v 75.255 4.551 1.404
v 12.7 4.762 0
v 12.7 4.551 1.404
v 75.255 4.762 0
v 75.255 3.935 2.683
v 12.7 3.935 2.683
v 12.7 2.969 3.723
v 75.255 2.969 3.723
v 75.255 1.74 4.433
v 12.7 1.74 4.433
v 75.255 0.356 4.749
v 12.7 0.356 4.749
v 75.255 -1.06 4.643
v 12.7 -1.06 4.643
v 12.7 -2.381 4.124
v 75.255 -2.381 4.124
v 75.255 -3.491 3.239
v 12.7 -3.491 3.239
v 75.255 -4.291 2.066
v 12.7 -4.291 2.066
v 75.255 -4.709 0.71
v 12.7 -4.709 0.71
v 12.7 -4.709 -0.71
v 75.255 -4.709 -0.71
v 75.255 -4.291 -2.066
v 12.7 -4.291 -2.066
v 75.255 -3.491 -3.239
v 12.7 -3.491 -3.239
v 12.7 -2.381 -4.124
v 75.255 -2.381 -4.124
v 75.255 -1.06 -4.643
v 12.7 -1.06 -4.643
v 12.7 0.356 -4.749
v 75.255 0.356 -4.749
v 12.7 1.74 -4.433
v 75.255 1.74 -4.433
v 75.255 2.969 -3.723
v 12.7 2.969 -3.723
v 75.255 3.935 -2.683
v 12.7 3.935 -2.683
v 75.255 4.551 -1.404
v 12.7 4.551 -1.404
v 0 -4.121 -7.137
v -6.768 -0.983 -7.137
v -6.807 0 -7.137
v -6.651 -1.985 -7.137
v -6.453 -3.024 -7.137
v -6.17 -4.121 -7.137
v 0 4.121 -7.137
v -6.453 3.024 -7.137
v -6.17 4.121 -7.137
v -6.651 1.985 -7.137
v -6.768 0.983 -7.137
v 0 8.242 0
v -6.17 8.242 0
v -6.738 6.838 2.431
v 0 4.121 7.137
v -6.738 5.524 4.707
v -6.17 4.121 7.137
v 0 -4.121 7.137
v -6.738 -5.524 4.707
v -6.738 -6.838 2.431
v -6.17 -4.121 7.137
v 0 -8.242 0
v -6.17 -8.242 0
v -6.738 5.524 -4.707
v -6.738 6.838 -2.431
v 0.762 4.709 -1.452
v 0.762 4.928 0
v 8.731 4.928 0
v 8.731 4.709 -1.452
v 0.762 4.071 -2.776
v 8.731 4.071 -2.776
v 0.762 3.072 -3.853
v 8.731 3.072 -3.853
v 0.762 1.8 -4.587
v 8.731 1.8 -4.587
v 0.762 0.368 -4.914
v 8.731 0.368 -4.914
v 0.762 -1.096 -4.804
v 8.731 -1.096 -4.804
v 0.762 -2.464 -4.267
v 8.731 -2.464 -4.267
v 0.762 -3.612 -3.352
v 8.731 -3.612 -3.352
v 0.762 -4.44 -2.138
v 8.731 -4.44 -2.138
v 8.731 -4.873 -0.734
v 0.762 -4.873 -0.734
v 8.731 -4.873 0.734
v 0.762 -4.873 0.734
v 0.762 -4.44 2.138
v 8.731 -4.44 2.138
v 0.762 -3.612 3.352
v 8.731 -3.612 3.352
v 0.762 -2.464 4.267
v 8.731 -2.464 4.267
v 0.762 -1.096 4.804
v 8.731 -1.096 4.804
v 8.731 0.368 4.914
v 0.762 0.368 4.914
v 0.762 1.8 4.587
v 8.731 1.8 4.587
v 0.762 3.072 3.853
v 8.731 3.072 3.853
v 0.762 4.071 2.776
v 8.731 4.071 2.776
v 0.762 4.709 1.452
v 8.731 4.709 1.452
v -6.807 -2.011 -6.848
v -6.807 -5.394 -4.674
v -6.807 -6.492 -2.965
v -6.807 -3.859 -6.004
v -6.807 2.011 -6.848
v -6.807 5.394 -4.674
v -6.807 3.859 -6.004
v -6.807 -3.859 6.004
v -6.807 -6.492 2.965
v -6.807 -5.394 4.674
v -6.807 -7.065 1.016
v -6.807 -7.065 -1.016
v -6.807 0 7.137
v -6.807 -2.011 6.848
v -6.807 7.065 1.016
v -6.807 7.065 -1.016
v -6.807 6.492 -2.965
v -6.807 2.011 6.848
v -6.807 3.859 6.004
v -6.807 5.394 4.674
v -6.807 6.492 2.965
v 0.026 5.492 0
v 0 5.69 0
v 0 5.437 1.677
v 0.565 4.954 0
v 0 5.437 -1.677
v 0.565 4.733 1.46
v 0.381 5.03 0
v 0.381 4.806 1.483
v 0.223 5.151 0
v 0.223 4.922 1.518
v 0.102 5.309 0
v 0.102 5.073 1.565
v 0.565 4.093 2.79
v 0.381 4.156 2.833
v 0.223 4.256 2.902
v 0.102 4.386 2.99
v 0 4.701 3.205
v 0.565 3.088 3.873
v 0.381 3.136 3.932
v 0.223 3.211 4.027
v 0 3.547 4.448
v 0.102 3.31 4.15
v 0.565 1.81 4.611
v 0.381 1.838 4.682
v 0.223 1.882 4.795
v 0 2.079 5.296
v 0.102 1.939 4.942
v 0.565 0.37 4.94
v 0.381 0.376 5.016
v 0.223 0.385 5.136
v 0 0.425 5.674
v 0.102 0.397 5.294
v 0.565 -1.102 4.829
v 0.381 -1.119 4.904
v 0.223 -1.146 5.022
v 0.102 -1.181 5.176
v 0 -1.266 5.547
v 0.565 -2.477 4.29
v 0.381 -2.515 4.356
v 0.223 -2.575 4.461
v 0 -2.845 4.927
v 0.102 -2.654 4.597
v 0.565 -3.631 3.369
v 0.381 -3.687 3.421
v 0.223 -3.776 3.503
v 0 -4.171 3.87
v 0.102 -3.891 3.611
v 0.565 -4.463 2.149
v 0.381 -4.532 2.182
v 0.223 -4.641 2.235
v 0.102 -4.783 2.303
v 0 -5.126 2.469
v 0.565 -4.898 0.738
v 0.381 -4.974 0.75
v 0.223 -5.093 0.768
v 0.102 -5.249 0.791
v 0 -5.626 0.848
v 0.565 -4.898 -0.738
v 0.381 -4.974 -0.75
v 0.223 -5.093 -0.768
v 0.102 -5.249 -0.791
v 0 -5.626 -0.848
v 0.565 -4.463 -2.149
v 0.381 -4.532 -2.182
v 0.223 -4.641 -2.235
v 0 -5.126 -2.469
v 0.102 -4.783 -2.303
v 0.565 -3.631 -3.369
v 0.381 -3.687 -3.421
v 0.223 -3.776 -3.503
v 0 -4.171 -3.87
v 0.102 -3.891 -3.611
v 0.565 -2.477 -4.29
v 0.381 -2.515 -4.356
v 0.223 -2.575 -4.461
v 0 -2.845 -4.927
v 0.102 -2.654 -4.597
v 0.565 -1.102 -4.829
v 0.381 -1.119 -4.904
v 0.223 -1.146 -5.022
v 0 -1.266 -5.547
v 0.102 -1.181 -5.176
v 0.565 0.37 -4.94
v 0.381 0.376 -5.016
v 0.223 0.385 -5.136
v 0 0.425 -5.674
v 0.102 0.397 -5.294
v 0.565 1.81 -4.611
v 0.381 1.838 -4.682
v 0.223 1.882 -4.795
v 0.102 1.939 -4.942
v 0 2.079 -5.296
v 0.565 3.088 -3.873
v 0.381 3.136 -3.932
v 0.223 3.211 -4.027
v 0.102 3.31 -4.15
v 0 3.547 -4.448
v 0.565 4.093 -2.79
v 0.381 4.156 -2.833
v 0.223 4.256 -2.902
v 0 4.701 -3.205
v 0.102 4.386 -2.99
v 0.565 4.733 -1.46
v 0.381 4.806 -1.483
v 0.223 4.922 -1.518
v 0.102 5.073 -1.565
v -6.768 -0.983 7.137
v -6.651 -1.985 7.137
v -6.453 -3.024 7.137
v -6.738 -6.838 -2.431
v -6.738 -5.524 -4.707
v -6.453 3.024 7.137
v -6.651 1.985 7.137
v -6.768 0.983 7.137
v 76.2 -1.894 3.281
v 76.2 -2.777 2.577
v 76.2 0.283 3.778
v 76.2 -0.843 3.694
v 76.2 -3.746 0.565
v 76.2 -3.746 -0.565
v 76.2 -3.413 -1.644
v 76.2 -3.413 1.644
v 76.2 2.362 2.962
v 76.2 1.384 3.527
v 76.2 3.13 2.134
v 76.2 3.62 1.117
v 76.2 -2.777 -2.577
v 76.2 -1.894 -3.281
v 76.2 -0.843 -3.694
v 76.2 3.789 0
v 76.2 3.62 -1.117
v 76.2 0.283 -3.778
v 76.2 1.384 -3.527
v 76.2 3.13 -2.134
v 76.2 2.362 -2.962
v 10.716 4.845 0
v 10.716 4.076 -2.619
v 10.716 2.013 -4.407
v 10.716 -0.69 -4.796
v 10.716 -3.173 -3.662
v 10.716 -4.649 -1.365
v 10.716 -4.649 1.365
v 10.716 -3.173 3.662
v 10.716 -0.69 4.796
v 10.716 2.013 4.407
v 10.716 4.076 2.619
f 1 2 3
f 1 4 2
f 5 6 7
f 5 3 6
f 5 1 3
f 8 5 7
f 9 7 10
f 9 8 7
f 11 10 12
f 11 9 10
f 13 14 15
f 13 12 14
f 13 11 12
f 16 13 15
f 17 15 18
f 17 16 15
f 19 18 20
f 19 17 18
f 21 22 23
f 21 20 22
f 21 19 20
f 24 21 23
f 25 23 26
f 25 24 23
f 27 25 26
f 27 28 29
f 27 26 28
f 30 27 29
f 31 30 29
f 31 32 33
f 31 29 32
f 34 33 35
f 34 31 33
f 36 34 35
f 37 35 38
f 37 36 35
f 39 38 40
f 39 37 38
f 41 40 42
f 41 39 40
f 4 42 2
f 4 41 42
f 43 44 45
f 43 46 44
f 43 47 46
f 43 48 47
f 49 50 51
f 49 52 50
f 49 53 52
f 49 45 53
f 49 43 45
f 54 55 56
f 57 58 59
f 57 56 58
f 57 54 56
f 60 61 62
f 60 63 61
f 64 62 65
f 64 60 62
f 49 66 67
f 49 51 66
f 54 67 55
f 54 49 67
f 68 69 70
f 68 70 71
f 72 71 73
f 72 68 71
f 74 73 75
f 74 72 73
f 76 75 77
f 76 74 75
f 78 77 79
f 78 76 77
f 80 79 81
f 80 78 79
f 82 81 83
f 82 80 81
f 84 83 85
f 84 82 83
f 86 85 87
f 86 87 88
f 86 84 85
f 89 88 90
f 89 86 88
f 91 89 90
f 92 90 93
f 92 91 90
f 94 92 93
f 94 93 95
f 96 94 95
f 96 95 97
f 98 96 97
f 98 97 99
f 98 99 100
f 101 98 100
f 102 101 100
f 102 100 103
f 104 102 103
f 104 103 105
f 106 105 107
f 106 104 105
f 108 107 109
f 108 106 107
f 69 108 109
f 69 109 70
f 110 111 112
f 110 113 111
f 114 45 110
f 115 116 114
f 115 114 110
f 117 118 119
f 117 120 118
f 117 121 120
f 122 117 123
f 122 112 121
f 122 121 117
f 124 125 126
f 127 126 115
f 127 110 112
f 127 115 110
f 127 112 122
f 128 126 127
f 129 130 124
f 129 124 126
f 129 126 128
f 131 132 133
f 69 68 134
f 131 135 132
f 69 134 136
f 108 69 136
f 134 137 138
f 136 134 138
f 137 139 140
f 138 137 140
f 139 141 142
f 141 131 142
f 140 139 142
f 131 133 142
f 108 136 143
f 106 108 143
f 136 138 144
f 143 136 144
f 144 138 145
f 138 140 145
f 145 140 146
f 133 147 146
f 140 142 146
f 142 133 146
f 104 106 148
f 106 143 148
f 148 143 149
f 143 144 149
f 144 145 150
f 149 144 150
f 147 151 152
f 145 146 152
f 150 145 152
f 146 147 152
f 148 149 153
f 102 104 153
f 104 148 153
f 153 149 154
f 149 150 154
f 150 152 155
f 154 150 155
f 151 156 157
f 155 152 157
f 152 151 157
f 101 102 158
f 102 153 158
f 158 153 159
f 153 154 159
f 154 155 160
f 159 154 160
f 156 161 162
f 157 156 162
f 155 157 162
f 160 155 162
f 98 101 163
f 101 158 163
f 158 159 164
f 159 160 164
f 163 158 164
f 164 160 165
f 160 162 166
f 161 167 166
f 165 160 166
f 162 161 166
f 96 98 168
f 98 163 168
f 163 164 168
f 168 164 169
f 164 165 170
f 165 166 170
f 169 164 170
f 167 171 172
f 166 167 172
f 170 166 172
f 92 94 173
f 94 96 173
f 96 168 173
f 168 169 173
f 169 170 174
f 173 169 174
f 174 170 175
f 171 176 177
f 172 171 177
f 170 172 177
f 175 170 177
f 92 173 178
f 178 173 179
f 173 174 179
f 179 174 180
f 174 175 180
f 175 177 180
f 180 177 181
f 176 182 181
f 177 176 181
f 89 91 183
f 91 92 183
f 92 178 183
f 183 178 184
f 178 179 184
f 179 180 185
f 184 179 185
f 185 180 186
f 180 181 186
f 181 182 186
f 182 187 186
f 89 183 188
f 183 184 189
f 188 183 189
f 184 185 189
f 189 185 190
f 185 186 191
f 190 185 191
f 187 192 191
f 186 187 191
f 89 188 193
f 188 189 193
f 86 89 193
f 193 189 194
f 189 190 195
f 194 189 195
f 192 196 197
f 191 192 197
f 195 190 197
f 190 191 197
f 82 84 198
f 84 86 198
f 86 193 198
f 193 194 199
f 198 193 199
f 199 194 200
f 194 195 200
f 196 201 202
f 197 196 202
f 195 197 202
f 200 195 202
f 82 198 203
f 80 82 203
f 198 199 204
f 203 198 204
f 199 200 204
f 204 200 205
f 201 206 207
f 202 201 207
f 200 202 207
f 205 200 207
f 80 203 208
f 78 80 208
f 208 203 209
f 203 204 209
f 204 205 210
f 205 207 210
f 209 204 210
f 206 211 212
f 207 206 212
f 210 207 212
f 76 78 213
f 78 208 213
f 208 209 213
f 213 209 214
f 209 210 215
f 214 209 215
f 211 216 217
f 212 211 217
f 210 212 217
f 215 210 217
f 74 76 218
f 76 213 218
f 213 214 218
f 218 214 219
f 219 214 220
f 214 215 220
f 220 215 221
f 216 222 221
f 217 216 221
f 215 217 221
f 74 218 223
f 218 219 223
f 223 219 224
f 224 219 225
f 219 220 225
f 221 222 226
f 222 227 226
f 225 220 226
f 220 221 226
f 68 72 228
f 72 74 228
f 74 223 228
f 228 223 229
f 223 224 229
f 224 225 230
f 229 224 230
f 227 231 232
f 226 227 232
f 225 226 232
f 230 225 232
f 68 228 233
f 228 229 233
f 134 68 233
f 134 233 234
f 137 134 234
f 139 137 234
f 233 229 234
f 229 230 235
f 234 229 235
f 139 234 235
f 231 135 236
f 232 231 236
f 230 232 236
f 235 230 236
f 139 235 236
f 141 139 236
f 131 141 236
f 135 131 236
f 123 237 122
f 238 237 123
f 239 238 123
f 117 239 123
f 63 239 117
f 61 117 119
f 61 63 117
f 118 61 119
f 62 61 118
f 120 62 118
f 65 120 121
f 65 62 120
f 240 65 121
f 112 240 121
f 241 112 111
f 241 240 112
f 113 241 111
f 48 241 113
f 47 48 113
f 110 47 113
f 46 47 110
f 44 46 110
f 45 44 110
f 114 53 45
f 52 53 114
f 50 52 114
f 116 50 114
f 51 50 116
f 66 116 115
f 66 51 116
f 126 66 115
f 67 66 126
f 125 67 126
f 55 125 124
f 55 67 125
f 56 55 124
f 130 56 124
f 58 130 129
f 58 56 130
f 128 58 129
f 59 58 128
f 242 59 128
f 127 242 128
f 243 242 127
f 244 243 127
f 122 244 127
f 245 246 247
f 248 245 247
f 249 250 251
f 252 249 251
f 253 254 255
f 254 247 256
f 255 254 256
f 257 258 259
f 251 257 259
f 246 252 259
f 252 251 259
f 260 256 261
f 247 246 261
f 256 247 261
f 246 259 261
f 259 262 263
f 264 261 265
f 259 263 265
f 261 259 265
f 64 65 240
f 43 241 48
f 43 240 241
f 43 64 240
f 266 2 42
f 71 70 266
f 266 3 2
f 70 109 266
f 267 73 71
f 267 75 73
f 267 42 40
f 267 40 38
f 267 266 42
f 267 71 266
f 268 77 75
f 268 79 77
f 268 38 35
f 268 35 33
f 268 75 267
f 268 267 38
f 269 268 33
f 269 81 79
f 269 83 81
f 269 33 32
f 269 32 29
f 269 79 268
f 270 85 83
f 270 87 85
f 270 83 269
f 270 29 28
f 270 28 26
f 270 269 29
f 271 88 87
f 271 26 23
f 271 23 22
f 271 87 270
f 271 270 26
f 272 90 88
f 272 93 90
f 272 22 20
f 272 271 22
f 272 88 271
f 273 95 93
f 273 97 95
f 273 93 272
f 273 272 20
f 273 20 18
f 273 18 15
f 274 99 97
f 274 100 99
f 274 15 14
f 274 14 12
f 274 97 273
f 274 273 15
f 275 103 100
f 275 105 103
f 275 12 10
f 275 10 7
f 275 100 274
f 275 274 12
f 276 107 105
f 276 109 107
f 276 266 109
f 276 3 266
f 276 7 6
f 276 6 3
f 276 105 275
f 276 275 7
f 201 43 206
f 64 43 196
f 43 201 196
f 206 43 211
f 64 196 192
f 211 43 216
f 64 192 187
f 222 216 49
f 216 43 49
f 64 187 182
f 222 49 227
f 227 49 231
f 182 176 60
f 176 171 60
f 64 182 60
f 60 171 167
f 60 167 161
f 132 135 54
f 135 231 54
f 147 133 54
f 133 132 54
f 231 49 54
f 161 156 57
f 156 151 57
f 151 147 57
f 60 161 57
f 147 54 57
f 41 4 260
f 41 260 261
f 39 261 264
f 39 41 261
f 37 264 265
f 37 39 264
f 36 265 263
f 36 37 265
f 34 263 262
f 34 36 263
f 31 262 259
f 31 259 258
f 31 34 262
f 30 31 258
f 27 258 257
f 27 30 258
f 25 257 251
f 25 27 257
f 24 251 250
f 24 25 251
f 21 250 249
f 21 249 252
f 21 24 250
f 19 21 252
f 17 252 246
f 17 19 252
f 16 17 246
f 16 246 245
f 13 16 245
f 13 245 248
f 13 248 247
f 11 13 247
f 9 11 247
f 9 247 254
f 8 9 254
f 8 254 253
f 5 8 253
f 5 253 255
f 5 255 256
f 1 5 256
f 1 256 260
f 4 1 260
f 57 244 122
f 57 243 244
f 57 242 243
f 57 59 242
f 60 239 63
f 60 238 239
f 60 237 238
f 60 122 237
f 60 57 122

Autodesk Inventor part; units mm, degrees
ref_plane "YZ Plane" through (0, 0, 0) normal (1, 0, 0) x (0, 1, 0)
ref_plane "XZ Plane" through (0, 0, 0) normal (0, 1, 0) x (-1, 0, 0)
sketch "Sketch1" plane through (0, 0, 0) normal (0, 0, 1) x (1, 0, 0)
  line L0 (0, 7.1374) -> (0, 4.9276)
  line L1 (12.7, 4.7625) -> (76.2, 4.7625)
  line L2 (76.2, 4.7625) -> (76.2, 0)
  line L3 (76.2, 0) -> (-0.0001, 0)
  line L4 (-15.2401, 0) -> (91.44, 0) projected
  line L5 (-0.0001, 0) -> (-0.0001, 7.1374)
  line L6 (-0.0001, 7.1374) -> (0, 7.1374)
  line L7 (12.7, 4.7625) -> (8.7311, 4.9276)
  line L8 (8.7311, 4.9276) -> (0, 4.9276)
  line L9 (0, -1.4275) -> (0, 8.5649) projected
  dimension "d0" = 76.2
  dimension "d1" = 63.5
revolve "Body" add sketch "Sketch1" angle 360 about axis through (76.2, 0, 0) along (-1, 0, 0)
sketch "Sketch2" plane through (-0.0001, 0, 0) normal (-1, 0, 0) x (0, 0, 1)
  line L0 (0, 8.2416) -> (7.1374, 4.1208)
  line L1 (7.1374, 4.1208) -> (7.1374, -4.1208)
  line L2 (7.1374, -4.1208) -> (0, -8.2416)
  line L3 (0, -8.2416) -> (-7.1374, -4.1208)
  line L4 (-7.1374, -4.1208) -> (-7.1374, 4.1208)
  line L5 (-7.1374, 4.1208) -> (0, 8.2416)
  point P0 (0, 0)
  point P1 (0, 0)
  dimension "d11" = 14.2748
extrude "Head" add sketch "Sketch2" along normal blind 6.8072
sketch "Sketch4" plane through (0, 0, 0) normal (0, 0, 1) x (1, 0, 0)
  line L0 (-6.8073, 7.1374) -> (-6.8073, 8.2416)
  line L1 (-6.8073, 8.2416) -> (-6.1698, 8.2416)
  line L2 (-6.1698, 8.2416) -> (-6.8073, 7.1374)
  line L3 (-8.1687, 0) -> (1.3613, 0) projected
  line L4 (-0.0001, 8.2416) -> (-6.8073, 8.2416) projected
  line L5 (-6.8073, 4.1208) -> (-6.8073, 8.2416) projected
  dimension "d5" = 30
  dimension "d19" = 14.2748
revolve "Chamfer1" cut sketch "Sketch4" angle 360 about axis through (-10, 0, 0) along (1, 0, 0)
thread "Thread" size "3/8-16 UNC" class "2A" standard "ANSI Unified Screw Threads" full length
chamfer "Chamfer2" distance 0.9739 distance2 0.9447 1 edges at (76.2, -4.7625, 0) measured on face at (76.2, -0.5629, 0.6211)
ref_plane "Work Plane1" through (1.525, 0, 0) normal (0, 0, 1) x (1, 0, 0)
fillet "Fillet2" radius 0.762 1 edges at (0, -4.9276, 0)
equation "\"d63\" = R"
equation "\"d11\" = SW"
equation "\"d3\" = KOH - SD"
equation "\"d15\" = GEL"
equation "\"d6\" = -0.5 * SPD + 0.5 * GD"
equation "\"d5\" = ANG1"
equation "\"d19\" = SW0"
equation "\"NLG\" = 190.5"
equation "\"GD\" = NND"
equation "\"BDM\" = 9.8552"
equation "\"KOH\" = 6.8072"
equation "\"GEL\" = 31.75"
equation "\"SW\" = 14.2748"
equation "\"SW0\" = SW"
equation "\"SPD\" = GD1"
equation "\"SD2\" = SW"
equation "\"SD\" = 0"
equation "\"ANG1\" = 30deg"
equation "\"GAL\" = 3.96875"
equation "\"GUL\" = 0.238 * GAL"
equation "\"R\" = 0.762"
equation "\"d62\" = -NLG - SD + GUL"
equation "\"GD1\" = 7.5773"
equation "\"THREADDIA\" = 9.525"
equation "\"TOA\" = 30deg"
equation "\"NND\" = 9.525"
equation "\"E0\" = 1.155 * SW"
properties part number "am-1055" material "Steel, Mild"
